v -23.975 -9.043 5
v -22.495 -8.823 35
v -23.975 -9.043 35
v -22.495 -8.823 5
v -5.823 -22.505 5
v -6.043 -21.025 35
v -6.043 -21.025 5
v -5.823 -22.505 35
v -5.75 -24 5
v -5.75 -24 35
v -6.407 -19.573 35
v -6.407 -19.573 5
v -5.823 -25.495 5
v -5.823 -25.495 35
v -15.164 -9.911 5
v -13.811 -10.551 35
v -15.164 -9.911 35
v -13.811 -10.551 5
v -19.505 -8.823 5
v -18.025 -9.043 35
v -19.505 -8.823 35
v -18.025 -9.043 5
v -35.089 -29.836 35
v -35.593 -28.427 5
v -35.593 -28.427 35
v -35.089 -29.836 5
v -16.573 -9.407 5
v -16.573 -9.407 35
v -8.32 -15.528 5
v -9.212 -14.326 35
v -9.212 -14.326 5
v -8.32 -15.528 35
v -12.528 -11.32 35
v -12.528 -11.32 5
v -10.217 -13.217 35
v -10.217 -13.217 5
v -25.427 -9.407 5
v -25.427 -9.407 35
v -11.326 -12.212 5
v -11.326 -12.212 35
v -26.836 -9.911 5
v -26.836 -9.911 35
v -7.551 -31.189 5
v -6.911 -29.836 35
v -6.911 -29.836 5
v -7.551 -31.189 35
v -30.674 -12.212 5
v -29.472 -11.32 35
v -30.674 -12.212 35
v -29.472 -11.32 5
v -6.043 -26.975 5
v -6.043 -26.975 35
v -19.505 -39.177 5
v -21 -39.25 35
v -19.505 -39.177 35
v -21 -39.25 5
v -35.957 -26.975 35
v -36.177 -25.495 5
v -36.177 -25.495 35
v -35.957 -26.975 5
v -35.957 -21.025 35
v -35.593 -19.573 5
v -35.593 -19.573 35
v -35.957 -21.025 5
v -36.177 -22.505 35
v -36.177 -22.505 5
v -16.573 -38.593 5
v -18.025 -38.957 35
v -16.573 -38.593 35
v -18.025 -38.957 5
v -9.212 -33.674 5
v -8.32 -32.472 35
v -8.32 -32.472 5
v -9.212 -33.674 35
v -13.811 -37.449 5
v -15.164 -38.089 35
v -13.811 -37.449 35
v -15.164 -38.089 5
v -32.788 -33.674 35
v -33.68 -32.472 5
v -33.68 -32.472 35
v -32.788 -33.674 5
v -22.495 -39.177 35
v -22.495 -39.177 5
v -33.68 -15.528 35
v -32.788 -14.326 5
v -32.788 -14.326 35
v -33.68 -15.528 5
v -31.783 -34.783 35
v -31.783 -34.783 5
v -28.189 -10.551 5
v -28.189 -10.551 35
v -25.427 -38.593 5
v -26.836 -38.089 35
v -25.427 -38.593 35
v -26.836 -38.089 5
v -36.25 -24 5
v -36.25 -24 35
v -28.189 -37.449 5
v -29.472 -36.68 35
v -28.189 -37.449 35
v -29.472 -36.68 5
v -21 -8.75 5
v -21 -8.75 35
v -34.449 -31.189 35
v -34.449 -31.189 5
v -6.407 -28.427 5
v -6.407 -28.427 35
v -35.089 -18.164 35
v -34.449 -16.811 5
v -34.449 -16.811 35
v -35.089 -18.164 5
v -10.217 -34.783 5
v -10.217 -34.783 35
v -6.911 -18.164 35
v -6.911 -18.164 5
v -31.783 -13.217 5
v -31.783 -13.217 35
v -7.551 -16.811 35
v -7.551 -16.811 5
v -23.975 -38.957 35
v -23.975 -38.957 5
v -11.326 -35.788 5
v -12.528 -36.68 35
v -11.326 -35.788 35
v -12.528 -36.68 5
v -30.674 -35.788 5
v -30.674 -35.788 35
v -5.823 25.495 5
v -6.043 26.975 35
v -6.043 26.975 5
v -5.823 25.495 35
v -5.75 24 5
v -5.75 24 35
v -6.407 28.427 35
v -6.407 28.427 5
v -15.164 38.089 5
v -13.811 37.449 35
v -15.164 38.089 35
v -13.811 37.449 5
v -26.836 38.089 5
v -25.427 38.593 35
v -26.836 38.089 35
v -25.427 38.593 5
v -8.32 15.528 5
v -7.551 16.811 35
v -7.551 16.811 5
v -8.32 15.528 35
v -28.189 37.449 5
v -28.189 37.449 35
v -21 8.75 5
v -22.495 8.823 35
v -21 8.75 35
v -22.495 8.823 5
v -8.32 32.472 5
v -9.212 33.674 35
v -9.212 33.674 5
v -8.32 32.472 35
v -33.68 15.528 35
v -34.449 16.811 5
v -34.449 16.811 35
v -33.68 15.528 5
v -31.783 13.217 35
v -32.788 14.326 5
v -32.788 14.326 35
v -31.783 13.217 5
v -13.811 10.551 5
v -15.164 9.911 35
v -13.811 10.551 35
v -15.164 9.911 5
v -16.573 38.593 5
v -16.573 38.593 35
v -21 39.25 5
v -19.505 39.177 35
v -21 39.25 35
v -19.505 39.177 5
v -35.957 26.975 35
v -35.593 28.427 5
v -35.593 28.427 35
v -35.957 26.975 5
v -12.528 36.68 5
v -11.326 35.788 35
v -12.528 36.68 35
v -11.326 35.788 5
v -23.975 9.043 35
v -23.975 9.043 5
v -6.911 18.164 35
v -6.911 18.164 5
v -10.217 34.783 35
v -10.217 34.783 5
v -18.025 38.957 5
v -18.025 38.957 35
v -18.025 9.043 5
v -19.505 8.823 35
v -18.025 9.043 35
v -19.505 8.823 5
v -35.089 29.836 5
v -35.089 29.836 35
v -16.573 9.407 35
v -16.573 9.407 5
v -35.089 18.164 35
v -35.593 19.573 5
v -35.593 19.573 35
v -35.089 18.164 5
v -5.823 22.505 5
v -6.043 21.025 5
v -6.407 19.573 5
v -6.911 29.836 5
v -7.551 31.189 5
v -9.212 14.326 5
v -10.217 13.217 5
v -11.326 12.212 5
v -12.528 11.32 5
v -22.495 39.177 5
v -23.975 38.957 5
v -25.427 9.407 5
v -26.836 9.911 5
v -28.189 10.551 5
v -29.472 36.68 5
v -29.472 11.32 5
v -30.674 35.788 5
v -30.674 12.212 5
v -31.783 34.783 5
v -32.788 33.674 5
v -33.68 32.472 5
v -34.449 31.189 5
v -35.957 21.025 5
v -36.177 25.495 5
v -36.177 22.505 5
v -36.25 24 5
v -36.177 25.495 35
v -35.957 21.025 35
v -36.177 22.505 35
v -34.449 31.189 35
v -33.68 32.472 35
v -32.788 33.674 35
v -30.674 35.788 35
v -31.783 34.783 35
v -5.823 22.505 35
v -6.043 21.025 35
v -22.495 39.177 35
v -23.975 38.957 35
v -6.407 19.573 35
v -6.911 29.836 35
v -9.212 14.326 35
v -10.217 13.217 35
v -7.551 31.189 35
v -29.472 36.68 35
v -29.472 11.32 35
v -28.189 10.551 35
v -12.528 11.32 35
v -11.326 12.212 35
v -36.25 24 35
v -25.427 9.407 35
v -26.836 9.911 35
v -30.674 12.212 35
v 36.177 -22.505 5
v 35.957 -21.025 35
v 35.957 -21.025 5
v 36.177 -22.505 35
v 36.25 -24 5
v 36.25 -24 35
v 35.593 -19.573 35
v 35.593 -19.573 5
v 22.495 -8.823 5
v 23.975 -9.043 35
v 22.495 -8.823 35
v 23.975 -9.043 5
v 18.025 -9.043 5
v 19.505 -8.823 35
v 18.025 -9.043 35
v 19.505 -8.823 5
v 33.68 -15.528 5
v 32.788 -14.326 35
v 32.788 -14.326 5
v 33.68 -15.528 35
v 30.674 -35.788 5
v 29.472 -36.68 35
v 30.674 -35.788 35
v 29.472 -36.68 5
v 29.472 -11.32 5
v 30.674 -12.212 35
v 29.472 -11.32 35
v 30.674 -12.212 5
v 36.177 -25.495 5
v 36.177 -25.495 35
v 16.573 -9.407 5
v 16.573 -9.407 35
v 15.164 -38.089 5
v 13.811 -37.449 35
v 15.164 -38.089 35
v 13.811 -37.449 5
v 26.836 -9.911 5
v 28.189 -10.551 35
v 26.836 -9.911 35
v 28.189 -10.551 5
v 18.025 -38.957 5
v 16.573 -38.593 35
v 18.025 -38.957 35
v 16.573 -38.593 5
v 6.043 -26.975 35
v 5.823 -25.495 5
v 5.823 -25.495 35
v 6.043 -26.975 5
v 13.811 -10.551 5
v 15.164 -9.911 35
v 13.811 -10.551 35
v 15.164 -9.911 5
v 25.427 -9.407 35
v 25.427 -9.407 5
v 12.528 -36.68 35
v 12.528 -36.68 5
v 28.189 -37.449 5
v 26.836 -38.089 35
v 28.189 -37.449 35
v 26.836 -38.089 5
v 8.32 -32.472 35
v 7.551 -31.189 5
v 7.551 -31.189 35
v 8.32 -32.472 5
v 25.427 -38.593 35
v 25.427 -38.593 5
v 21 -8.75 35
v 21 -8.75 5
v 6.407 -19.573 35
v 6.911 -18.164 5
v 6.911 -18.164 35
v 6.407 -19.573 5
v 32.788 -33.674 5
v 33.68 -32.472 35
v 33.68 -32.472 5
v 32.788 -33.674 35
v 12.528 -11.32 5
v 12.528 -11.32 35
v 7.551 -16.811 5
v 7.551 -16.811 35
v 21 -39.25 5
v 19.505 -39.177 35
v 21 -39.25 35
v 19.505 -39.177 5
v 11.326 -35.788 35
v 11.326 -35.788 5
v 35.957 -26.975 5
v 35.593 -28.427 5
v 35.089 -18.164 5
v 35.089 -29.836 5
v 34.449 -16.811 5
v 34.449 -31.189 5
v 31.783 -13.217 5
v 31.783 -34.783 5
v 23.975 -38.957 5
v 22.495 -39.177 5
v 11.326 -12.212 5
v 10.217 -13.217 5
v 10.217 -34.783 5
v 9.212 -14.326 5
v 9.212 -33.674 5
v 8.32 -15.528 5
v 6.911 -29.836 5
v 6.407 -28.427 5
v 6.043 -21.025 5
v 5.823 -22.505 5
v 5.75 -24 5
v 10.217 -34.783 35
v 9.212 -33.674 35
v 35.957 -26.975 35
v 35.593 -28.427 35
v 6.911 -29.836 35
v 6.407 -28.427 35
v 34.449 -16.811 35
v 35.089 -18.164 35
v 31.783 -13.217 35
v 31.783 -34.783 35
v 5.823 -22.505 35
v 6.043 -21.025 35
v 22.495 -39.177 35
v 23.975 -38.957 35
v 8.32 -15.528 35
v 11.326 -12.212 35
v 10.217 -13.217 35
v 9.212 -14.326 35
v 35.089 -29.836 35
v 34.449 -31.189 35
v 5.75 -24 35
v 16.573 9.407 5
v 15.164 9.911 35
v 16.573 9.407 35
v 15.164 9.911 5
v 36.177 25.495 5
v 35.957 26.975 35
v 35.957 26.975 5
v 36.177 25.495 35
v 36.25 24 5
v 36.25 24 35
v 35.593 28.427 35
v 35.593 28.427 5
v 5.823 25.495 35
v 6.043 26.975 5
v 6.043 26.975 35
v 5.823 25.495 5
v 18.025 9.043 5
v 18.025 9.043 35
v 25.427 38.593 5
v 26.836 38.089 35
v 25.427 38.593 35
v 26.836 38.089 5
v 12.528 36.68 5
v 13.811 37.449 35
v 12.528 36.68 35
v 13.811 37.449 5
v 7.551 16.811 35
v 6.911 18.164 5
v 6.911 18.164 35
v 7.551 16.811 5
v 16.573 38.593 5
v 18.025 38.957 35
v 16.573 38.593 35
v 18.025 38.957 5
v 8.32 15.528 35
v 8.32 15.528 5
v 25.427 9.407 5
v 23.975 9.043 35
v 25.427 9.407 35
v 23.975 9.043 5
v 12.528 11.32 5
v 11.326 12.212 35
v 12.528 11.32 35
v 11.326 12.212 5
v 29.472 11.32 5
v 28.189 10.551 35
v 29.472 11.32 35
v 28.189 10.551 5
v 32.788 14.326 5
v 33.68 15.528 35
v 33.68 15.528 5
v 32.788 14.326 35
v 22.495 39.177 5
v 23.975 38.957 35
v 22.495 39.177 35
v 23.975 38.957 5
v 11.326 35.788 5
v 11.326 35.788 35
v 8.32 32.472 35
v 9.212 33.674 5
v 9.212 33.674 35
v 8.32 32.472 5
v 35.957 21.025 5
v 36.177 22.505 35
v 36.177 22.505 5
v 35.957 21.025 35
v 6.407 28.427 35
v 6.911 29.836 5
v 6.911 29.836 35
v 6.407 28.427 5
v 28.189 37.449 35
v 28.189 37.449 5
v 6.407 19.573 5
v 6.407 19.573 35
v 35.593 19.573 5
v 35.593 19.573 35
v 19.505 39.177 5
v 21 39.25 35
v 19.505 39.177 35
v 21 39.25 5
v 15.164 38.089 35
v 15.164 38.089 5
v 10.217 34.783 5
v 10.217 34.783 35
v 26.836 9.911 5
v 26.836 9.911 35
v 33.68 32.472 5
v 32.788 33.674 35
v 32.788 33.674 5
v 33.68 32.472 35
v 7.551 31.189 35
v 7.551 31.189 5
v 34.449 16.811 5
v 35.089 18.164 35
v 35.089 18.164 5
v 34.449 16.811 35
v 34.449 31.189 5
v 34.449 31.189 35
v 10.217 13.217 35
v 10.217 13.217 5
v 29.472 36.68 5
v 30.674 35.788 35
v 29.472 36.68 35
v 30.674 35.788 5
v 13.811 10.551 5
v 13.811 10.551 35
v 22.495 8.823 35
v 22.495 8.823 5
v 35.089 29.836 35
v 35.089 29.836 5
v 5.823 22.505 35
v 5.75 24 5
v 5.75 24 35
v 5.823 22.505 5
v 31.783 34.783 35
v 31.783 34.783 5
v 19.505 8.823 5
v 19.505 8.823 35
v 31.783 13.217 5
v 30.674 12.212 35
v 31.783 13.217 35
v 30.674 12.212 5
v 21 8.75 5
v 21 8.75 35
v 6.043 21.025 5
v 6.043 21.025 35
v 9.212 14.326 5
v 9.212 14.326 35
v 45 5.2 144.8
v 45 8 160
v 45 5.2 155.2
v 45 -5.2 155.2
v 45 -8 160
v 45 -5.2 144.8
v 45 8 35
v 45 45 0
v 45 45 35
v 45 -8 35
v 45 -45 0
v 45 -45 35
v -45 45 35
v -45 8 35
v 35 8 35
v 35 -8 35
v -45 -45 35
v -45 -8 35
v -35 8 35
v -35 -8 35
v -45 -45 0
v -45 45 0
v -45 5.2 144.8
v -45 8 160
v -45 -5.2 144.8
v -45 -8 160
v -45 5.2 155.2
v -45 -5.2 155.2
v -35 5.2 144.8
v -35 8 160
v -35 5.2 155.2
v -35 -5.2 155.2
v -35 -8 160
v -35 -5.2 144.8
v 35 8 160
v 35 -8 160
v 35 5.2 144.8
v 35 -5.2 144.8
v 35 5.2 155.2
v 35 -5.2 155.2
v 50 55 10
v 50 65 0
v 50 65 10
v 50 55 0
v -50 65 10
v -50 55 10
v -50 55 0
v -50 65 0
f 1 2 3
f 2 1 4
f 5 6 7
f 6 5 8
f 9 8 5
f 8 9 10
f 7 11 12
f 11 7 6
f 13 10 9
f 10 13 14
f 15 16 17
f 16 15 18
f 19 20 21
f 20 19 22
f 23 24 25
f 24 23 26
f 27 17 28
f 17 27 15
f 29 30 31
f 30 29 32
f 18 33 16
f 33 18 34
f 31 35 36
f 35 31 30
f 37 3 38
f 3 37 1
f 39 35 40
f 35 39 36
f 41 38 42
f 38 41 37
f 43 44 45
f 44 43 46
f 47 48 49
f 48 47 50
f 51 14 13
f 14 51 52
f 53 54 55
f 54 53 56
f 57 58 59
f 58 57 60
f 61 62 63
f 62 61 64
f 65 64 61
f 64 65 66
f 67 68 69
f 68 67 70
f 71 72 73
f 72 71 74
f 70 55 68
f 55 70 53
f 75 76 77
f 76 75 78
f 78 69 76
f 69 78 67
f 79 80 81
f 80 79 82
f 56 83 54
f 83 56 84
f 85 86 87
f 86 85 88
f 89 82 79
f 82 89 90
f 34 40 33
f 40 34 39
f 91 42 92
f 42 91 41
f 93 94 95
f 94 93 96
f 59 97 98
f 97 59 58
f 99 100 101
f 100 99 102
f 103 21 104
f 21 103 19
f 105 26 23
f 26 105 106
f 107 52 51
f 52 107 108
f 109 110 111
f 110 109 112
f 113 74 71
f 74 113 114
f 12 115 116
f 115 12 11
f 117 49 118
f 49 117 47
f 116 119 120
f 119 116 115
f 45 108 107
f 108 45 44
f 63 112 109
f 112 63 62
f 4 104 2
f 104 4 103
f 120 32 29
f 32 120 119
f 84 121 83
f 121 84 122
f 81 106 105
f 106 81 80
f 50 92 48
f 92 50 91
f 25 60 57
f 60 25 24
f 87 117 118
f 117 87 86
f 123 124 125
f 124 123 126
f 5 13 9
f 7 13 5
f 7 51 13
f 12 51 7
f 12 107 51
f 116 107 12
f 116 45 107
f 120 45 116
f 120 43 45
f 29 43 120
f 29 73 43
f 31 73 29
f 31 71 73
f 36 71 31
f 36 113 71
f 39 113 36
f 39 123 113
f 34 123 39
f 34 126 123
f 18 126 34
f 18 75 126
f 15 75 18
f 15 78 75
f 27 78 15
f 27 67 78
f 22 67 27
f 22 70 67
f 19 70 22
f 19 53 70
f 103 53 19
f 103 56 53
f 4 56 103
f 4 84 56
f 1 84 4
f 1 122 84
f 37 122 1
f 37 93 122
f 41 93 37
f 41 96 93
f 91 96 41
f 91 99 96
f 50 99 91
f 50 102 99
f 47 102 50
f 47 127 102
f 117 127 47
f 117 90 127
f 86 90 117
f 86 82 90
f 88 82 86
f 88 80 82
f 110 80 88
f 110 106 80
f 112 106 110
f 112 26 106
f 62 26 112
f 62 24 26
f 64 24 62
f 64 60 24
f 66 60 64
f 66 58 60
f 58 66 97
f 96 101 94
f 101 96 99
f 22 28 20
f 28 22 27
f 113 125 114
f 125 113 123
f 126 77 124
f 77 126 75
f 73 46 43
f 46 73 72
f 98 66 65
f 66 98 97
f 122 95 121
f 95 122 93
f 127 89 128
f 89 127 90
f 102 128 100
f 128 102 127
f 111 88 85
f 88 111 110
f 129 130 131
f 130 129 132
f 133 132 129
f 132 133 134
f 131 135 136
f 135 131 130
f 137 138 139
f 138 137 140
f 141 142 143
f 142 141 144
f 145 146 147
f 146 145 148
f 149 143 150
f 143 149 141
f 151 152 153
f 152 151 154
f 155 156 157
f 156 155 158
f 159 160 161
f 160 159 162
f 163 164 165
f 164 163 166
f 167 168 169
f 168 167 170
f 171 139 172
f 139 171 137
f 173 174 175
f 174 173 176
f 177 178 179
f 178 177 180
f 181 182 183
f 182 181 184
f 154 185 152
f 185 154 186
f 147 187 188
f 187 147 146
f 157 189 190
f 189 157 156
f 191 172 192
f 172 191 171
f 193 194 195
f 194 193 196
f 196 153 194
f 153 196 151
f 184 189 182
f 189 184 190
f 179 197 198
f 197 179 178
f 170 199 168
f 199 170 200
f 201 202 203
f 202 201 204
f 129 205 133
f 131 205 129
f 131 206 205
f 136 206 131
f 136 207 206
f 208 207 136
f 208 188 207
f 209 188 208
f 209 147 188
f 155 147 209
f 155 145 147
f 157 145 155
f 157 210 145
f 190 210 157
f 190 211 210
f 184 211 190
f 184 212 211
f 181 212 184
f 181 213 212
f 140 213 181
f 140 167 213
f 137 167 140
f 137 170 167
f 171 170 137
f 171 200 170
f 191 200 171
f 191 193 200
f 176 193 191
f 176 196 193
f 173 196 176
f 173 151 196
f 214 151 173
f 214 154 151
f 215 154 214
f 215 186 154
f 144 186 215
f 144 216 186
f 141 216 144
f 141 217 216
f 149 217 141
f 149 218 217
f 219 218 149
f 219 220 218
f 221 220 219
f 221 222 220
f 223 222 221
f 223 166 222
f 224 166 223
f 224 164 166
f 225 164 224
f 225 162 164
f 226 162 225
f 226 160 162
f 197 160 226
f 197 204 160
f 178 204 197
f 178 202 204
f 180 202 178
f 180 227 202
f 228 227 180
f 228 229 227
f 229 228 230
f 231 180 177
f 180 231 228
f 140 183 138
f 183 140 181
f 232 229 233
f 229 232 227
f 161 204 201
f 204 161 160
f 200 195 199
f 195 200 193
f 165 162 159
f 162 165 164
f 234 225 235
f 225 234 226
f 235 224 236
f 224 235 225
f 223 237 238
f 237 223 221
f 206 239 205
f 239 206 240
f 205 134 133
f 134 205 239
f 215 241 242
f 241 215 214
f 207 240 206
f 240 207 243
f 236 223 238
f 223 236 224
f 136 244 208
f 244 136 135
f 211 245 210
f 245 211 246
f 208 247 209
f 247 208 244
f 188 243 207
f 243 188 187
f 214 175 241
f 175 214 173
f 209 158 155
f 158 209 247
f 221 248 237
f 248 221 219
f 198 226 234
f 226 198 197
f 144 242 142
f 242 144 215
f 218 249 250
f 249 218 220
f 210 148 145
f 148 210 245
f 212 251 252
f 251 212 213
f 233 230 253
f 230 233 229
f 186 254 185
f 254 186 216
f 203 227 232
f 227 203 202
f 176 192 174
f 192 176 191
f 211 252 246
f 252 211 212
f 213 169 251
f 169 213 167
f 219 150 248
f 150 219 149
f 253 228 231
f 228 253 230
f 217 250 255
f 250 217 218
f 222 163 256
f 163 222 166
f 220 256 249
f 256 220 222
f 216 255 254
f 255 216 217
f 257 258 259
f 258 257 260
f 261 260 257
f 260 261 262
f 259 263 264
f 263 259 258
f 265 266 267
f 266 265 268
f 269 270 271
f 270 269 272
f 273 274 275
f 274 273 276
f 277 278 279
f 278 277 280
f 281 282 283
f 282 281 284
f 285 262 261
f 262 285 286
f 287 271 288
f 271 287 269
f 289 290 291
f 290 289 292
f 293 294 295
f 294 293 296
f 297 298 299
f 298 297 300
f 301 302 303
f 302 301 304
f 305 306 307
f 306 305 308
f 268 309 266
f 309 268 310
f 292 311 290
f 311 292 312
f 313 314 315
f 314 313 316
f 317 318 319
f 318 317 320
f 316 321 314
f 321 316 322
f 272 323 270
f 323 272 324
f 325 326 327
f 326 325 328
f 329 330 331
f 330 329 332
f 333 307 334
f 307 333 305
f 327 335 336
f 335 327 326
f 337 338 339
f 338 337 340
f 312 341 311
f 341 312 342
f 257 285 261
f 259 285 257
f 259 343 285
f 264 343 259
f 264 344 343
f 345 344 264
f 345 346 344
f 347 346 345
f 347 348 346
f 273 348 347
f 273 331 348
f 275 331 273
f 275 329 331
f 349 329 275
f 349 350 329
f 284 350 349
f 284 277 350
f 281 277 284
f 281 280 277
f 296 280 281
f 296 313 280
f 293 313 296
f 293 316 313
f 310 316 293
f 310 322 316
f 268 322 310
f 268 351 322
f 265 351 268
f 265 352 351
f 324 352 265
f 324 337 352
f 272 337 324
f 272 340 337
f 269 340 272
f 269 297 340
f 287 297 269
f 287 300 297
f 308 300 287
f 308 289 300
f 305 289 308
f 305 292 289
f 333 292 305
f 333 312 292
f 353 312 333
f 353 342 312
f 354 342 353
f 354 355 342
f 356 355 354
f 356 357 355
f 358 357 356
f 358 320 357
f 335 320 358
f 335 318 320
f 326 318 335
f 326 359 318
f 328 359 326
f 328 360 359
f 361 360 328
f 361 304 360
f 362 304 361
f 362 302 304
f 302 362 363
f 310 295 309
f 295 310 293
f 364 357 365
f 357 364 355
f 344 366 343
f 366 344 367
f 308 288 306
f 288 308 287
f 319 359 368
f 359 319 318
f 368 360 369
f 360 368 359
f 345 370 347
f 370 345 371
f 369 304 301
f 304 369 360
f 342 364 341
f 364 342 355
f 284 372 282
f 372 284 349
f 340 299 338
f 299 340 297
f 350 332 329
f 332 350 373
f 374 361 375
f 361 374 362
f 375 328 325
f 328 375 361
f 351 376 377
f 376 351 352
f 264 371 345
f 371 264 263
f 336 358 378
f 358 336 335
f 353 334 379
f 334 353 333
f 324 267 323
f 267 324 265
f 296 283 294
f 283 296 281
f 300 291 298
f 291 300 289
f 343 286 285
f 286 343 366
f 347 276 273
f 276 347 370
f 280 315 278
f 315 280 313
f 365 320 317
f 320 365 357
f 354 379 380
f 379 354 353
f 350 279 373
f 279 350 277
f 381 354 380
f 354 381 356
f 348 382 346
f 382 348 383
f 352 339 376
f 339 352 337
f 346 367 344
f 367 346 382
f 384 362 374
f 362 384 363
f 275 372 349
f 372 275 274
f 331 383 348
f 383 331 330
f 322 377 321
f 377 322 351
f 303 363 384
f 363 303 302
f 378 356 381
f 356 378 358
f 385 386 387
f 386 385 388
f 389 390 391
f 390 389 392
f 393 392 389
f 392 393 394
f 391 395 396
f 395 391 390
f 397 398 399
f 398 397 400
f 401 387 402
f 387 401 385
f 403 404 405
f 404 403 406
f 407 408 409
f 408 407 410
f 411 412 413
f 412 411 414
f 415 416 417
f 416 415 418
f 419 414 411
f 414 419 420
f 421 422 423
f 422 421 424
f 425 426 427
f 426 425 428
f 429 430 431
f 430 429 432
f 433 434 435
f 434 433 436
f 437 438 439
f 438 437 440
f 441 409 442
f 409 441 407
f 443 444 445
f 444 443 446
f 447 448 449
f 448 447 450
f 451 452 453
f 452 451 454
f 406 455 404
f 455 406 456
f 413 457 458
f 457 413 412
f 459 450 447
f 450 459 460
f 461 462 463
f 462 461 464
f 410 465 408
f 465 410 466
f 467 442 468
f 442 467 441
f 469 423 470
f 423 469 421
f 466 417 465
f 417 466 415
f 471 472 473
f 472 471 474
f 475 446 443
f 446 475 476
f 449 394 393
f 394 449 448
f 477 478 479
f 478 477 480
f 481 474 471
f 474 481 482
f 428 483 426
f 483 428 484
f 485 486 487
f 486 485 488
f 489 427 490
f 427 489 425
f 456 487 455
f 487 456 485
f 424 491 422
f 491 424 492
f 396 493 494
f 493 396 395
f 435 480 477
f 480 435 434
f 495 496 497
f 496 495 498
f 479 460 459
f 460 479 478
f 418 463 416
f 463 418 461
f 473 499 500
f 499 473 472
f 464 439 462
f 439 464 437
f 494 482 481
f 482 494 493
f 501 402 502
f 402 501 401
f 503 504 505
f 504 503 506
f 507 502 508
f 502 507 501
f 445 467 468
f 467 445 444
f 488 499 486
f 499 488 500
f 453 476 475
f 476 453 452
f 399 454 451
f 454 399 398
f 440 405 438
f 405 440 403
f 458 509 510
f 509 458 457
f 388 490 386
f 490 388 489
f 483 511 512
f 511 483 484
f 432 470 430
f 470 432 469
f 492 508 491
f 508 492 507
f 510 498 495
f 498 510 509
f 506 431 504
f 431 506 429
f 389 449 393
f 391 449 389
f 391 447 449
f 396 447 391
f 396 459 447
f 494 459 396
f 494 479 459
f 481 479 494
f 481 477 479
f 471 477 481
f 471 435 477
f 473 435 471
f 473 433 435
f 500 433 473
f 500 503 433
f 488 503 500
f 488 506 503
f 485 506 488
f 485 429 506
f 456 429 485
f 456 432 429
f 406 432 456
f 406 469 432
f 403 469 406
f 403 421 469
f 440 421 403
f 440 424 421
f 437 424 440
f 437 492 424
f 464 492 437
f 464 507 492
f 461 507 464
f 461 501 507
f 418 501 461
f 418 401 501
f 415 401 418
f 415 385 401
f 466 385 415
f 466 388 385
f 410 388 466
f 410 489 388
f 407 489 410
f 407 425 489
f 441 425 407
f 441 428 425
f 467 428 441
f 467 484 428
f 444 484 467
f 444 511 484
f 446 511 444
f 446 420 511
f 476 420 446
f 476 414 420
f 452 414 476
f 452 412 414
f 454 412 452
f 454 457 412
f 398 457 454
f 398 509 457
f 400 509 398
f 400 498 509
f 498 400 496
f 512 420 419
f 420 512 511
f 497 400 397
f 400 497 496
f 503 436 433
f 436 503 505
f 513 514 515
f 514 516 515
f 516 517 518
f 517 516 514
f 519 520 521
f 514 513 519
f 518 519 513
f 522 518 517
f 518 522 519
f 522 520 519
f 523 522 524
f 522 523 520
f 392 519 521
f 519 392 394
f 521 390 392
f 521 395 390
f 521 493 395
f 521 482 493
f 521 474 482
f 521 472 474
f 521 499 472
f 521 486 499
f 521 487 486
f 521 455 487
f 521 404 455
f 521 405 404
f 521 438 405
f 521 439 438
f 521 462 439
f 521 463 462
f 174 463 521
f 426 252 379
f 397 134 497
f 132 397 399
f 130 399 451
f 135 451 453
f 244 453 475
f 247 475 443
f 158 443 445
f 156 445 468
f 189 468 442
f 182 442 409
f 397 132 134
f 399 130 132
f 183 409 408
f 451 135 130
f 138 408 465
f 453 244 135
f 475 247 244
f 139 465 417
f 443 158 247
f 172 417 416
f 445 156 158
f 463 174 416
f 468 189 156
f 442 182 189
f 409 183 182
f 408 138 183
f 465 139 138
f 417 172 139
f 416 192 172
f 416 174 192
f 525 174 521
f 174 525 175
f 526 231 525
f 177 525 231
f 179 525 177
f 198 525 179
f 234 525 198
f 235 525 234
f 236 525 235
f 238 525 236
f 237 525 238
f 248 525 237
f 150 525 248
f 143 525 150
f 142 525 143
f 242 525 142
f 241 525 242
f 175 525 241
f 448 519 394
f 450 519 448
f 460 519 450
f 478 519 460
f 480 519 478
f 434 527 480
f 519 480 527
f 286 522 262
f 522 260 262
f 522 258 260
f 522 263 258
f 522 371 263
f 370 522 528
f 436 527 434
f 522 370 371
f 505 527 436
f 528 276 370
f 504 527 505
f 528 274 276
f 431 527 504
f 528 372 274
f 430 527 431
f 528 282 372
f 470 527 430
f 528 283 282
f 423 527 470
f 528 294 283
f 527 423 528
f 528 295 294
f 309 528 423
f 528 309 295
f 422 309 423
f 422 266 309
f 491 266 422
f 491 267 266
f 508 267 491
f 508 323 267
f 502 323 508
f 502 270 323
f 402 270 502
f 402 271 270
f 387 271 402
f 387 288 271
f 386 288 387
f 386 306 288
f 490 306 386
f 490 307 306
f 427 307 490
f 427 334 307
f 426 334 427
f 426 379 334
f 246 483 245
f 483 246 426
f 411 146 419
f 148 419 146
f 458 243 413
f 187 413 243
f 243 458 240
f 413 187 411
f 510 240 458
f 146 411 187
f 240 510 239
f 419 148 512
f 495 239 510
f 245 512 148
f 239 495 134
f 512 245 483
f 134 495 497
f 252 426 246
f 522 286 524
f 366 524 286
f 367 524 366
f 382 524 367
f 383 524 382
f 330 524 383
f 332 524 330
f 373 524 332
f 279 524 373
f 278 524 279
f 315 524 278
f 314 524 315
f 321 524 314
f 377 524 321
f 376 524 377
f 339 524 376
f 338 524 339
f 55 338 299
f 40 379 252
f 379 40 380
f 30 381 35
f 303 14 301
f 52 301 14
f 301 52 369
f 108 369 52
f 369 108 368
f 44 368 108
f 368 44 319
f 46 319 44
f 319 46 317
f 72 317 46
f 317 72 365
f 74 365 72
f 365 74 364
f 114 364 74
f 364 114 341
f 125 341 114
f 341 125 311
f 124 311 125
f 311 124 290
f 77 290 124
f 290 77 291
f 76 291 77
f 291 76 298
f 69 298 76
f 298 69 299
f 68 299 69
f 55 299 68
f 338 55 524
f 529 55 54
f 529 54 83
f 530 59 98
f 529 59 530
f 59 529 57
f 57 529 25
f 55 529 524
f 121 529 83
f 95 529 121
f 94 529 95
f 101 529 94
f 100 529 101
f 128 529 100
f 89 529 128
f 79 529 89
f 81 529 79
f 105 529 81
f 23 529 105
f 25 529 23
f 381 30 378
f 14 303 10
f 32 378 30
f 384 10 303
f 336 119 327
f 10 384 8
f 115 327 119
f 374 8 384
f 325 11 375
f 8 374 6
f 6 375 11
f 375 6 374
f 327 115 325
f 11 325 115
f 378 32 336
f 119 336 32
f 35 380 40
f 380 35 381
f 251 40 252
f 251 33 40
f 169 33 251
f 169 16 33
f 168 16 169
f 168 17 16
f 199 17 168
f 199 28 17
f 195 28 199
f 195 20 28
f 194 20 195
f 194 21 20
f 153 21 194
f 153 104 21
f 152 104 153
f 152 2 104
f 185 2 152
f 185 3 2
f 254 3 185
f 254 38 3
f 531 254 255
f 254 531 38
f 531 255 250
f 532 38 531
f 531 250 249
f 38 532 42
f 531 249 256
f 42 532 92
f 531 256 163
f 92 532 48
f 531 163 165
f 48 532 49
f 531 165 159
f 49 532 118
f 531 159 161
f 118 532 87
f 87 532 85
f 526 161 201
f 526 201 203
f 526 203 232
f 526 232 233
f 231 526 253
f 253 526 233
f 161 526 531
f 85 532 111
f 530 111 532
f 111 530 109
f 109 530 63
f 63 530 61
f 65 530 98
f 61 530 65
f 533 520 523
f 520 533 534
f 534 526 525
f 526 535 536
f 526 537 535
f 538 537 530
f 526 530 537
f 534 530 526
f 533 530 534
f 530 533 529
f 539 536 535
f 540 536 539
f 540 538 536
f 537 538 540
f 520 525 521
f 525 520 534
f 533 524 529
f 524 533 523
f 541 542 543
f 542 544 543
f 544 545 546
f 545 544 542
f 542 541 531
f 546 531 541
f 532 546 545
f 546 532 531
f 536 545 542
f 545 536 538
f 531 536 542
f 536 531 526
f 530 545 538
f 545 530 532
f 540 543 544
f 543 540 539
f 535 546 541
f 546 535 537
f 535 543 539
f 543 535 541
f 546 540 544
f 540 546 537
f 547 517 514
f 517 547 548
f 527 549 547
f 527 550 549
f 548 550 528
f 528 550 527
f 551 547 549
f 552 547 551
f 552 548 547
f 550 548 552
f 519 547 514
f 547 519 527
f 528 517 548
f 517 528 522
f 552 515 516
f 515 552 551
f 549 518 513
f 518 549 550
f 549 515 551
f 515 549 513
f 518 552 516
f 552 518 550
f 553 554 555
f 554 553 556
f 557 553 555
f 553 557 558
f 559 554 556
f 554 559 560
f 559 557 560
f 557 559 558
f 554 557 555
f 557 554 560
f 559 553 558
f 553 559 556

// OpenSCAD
// Carrier for four 50 mL conical tubes with handle (two parts, side by side)
$fn = 64;

// Base
base_x = 90;          // base length X
base_y = 90;          // base width Y
base_h = 35;          // base height
seat_d = 30.5;        // tube seat diameter
seat_depth = 30;      // seat depth (5 mm floor)
seat_x = 21;          // seat X offset (+/-)
seat_y = 24;          // seat Y offset (+/-)

// Posts
post_t = 10;          // post thickness X
post_w = 16;          // post width Y
post_top = 160;       // post top height
hole_s = 10.4;        // square hole size
hole_z = 150;         // hole centre height

// Handle bar
bar_s = 10;           // bar cross-section
bar_len = 100;        // bar length along X
bar_y0 = 55;          // bar start Y (10 mm gap to base +Y face at 45)

// Part 1: base with seats
module base() {
    difference() {
        translate([-base_x/2, -base_y/2, 0]) cube([base_x, base_y, base_h]);
        for (sx = [-1, 1], sy = [-1, 1])
            translate([sx*seat_x, sy*seat_y, base_h - seat_depth])
                cylinder(d = seat_d, h = seat_depth + 1);
    }
}

// Posts with square through-holes
module posts() {
    for (sx = [-1, 1])
        difference() {
            translate([sx > 0 ? base_x/2 - post_t : -base_x/2, -post_w/2, base_h - 1])
                cube([post_t, post_w, post_top - base_h + 1]);
            translate([sx*(base_x/2 - post_t/2) - 5.5, -hole_s/2, hole_z - hole_s/2])
                cube([11, hole_s, hole_s]);
        }
}

// Part 2: handle bar
module handle() {
    translate([-bar_len/2, bar_y0, 0]) cube([bar_len, bar_s, bar_s]);
}

base();
posts();
handle();
